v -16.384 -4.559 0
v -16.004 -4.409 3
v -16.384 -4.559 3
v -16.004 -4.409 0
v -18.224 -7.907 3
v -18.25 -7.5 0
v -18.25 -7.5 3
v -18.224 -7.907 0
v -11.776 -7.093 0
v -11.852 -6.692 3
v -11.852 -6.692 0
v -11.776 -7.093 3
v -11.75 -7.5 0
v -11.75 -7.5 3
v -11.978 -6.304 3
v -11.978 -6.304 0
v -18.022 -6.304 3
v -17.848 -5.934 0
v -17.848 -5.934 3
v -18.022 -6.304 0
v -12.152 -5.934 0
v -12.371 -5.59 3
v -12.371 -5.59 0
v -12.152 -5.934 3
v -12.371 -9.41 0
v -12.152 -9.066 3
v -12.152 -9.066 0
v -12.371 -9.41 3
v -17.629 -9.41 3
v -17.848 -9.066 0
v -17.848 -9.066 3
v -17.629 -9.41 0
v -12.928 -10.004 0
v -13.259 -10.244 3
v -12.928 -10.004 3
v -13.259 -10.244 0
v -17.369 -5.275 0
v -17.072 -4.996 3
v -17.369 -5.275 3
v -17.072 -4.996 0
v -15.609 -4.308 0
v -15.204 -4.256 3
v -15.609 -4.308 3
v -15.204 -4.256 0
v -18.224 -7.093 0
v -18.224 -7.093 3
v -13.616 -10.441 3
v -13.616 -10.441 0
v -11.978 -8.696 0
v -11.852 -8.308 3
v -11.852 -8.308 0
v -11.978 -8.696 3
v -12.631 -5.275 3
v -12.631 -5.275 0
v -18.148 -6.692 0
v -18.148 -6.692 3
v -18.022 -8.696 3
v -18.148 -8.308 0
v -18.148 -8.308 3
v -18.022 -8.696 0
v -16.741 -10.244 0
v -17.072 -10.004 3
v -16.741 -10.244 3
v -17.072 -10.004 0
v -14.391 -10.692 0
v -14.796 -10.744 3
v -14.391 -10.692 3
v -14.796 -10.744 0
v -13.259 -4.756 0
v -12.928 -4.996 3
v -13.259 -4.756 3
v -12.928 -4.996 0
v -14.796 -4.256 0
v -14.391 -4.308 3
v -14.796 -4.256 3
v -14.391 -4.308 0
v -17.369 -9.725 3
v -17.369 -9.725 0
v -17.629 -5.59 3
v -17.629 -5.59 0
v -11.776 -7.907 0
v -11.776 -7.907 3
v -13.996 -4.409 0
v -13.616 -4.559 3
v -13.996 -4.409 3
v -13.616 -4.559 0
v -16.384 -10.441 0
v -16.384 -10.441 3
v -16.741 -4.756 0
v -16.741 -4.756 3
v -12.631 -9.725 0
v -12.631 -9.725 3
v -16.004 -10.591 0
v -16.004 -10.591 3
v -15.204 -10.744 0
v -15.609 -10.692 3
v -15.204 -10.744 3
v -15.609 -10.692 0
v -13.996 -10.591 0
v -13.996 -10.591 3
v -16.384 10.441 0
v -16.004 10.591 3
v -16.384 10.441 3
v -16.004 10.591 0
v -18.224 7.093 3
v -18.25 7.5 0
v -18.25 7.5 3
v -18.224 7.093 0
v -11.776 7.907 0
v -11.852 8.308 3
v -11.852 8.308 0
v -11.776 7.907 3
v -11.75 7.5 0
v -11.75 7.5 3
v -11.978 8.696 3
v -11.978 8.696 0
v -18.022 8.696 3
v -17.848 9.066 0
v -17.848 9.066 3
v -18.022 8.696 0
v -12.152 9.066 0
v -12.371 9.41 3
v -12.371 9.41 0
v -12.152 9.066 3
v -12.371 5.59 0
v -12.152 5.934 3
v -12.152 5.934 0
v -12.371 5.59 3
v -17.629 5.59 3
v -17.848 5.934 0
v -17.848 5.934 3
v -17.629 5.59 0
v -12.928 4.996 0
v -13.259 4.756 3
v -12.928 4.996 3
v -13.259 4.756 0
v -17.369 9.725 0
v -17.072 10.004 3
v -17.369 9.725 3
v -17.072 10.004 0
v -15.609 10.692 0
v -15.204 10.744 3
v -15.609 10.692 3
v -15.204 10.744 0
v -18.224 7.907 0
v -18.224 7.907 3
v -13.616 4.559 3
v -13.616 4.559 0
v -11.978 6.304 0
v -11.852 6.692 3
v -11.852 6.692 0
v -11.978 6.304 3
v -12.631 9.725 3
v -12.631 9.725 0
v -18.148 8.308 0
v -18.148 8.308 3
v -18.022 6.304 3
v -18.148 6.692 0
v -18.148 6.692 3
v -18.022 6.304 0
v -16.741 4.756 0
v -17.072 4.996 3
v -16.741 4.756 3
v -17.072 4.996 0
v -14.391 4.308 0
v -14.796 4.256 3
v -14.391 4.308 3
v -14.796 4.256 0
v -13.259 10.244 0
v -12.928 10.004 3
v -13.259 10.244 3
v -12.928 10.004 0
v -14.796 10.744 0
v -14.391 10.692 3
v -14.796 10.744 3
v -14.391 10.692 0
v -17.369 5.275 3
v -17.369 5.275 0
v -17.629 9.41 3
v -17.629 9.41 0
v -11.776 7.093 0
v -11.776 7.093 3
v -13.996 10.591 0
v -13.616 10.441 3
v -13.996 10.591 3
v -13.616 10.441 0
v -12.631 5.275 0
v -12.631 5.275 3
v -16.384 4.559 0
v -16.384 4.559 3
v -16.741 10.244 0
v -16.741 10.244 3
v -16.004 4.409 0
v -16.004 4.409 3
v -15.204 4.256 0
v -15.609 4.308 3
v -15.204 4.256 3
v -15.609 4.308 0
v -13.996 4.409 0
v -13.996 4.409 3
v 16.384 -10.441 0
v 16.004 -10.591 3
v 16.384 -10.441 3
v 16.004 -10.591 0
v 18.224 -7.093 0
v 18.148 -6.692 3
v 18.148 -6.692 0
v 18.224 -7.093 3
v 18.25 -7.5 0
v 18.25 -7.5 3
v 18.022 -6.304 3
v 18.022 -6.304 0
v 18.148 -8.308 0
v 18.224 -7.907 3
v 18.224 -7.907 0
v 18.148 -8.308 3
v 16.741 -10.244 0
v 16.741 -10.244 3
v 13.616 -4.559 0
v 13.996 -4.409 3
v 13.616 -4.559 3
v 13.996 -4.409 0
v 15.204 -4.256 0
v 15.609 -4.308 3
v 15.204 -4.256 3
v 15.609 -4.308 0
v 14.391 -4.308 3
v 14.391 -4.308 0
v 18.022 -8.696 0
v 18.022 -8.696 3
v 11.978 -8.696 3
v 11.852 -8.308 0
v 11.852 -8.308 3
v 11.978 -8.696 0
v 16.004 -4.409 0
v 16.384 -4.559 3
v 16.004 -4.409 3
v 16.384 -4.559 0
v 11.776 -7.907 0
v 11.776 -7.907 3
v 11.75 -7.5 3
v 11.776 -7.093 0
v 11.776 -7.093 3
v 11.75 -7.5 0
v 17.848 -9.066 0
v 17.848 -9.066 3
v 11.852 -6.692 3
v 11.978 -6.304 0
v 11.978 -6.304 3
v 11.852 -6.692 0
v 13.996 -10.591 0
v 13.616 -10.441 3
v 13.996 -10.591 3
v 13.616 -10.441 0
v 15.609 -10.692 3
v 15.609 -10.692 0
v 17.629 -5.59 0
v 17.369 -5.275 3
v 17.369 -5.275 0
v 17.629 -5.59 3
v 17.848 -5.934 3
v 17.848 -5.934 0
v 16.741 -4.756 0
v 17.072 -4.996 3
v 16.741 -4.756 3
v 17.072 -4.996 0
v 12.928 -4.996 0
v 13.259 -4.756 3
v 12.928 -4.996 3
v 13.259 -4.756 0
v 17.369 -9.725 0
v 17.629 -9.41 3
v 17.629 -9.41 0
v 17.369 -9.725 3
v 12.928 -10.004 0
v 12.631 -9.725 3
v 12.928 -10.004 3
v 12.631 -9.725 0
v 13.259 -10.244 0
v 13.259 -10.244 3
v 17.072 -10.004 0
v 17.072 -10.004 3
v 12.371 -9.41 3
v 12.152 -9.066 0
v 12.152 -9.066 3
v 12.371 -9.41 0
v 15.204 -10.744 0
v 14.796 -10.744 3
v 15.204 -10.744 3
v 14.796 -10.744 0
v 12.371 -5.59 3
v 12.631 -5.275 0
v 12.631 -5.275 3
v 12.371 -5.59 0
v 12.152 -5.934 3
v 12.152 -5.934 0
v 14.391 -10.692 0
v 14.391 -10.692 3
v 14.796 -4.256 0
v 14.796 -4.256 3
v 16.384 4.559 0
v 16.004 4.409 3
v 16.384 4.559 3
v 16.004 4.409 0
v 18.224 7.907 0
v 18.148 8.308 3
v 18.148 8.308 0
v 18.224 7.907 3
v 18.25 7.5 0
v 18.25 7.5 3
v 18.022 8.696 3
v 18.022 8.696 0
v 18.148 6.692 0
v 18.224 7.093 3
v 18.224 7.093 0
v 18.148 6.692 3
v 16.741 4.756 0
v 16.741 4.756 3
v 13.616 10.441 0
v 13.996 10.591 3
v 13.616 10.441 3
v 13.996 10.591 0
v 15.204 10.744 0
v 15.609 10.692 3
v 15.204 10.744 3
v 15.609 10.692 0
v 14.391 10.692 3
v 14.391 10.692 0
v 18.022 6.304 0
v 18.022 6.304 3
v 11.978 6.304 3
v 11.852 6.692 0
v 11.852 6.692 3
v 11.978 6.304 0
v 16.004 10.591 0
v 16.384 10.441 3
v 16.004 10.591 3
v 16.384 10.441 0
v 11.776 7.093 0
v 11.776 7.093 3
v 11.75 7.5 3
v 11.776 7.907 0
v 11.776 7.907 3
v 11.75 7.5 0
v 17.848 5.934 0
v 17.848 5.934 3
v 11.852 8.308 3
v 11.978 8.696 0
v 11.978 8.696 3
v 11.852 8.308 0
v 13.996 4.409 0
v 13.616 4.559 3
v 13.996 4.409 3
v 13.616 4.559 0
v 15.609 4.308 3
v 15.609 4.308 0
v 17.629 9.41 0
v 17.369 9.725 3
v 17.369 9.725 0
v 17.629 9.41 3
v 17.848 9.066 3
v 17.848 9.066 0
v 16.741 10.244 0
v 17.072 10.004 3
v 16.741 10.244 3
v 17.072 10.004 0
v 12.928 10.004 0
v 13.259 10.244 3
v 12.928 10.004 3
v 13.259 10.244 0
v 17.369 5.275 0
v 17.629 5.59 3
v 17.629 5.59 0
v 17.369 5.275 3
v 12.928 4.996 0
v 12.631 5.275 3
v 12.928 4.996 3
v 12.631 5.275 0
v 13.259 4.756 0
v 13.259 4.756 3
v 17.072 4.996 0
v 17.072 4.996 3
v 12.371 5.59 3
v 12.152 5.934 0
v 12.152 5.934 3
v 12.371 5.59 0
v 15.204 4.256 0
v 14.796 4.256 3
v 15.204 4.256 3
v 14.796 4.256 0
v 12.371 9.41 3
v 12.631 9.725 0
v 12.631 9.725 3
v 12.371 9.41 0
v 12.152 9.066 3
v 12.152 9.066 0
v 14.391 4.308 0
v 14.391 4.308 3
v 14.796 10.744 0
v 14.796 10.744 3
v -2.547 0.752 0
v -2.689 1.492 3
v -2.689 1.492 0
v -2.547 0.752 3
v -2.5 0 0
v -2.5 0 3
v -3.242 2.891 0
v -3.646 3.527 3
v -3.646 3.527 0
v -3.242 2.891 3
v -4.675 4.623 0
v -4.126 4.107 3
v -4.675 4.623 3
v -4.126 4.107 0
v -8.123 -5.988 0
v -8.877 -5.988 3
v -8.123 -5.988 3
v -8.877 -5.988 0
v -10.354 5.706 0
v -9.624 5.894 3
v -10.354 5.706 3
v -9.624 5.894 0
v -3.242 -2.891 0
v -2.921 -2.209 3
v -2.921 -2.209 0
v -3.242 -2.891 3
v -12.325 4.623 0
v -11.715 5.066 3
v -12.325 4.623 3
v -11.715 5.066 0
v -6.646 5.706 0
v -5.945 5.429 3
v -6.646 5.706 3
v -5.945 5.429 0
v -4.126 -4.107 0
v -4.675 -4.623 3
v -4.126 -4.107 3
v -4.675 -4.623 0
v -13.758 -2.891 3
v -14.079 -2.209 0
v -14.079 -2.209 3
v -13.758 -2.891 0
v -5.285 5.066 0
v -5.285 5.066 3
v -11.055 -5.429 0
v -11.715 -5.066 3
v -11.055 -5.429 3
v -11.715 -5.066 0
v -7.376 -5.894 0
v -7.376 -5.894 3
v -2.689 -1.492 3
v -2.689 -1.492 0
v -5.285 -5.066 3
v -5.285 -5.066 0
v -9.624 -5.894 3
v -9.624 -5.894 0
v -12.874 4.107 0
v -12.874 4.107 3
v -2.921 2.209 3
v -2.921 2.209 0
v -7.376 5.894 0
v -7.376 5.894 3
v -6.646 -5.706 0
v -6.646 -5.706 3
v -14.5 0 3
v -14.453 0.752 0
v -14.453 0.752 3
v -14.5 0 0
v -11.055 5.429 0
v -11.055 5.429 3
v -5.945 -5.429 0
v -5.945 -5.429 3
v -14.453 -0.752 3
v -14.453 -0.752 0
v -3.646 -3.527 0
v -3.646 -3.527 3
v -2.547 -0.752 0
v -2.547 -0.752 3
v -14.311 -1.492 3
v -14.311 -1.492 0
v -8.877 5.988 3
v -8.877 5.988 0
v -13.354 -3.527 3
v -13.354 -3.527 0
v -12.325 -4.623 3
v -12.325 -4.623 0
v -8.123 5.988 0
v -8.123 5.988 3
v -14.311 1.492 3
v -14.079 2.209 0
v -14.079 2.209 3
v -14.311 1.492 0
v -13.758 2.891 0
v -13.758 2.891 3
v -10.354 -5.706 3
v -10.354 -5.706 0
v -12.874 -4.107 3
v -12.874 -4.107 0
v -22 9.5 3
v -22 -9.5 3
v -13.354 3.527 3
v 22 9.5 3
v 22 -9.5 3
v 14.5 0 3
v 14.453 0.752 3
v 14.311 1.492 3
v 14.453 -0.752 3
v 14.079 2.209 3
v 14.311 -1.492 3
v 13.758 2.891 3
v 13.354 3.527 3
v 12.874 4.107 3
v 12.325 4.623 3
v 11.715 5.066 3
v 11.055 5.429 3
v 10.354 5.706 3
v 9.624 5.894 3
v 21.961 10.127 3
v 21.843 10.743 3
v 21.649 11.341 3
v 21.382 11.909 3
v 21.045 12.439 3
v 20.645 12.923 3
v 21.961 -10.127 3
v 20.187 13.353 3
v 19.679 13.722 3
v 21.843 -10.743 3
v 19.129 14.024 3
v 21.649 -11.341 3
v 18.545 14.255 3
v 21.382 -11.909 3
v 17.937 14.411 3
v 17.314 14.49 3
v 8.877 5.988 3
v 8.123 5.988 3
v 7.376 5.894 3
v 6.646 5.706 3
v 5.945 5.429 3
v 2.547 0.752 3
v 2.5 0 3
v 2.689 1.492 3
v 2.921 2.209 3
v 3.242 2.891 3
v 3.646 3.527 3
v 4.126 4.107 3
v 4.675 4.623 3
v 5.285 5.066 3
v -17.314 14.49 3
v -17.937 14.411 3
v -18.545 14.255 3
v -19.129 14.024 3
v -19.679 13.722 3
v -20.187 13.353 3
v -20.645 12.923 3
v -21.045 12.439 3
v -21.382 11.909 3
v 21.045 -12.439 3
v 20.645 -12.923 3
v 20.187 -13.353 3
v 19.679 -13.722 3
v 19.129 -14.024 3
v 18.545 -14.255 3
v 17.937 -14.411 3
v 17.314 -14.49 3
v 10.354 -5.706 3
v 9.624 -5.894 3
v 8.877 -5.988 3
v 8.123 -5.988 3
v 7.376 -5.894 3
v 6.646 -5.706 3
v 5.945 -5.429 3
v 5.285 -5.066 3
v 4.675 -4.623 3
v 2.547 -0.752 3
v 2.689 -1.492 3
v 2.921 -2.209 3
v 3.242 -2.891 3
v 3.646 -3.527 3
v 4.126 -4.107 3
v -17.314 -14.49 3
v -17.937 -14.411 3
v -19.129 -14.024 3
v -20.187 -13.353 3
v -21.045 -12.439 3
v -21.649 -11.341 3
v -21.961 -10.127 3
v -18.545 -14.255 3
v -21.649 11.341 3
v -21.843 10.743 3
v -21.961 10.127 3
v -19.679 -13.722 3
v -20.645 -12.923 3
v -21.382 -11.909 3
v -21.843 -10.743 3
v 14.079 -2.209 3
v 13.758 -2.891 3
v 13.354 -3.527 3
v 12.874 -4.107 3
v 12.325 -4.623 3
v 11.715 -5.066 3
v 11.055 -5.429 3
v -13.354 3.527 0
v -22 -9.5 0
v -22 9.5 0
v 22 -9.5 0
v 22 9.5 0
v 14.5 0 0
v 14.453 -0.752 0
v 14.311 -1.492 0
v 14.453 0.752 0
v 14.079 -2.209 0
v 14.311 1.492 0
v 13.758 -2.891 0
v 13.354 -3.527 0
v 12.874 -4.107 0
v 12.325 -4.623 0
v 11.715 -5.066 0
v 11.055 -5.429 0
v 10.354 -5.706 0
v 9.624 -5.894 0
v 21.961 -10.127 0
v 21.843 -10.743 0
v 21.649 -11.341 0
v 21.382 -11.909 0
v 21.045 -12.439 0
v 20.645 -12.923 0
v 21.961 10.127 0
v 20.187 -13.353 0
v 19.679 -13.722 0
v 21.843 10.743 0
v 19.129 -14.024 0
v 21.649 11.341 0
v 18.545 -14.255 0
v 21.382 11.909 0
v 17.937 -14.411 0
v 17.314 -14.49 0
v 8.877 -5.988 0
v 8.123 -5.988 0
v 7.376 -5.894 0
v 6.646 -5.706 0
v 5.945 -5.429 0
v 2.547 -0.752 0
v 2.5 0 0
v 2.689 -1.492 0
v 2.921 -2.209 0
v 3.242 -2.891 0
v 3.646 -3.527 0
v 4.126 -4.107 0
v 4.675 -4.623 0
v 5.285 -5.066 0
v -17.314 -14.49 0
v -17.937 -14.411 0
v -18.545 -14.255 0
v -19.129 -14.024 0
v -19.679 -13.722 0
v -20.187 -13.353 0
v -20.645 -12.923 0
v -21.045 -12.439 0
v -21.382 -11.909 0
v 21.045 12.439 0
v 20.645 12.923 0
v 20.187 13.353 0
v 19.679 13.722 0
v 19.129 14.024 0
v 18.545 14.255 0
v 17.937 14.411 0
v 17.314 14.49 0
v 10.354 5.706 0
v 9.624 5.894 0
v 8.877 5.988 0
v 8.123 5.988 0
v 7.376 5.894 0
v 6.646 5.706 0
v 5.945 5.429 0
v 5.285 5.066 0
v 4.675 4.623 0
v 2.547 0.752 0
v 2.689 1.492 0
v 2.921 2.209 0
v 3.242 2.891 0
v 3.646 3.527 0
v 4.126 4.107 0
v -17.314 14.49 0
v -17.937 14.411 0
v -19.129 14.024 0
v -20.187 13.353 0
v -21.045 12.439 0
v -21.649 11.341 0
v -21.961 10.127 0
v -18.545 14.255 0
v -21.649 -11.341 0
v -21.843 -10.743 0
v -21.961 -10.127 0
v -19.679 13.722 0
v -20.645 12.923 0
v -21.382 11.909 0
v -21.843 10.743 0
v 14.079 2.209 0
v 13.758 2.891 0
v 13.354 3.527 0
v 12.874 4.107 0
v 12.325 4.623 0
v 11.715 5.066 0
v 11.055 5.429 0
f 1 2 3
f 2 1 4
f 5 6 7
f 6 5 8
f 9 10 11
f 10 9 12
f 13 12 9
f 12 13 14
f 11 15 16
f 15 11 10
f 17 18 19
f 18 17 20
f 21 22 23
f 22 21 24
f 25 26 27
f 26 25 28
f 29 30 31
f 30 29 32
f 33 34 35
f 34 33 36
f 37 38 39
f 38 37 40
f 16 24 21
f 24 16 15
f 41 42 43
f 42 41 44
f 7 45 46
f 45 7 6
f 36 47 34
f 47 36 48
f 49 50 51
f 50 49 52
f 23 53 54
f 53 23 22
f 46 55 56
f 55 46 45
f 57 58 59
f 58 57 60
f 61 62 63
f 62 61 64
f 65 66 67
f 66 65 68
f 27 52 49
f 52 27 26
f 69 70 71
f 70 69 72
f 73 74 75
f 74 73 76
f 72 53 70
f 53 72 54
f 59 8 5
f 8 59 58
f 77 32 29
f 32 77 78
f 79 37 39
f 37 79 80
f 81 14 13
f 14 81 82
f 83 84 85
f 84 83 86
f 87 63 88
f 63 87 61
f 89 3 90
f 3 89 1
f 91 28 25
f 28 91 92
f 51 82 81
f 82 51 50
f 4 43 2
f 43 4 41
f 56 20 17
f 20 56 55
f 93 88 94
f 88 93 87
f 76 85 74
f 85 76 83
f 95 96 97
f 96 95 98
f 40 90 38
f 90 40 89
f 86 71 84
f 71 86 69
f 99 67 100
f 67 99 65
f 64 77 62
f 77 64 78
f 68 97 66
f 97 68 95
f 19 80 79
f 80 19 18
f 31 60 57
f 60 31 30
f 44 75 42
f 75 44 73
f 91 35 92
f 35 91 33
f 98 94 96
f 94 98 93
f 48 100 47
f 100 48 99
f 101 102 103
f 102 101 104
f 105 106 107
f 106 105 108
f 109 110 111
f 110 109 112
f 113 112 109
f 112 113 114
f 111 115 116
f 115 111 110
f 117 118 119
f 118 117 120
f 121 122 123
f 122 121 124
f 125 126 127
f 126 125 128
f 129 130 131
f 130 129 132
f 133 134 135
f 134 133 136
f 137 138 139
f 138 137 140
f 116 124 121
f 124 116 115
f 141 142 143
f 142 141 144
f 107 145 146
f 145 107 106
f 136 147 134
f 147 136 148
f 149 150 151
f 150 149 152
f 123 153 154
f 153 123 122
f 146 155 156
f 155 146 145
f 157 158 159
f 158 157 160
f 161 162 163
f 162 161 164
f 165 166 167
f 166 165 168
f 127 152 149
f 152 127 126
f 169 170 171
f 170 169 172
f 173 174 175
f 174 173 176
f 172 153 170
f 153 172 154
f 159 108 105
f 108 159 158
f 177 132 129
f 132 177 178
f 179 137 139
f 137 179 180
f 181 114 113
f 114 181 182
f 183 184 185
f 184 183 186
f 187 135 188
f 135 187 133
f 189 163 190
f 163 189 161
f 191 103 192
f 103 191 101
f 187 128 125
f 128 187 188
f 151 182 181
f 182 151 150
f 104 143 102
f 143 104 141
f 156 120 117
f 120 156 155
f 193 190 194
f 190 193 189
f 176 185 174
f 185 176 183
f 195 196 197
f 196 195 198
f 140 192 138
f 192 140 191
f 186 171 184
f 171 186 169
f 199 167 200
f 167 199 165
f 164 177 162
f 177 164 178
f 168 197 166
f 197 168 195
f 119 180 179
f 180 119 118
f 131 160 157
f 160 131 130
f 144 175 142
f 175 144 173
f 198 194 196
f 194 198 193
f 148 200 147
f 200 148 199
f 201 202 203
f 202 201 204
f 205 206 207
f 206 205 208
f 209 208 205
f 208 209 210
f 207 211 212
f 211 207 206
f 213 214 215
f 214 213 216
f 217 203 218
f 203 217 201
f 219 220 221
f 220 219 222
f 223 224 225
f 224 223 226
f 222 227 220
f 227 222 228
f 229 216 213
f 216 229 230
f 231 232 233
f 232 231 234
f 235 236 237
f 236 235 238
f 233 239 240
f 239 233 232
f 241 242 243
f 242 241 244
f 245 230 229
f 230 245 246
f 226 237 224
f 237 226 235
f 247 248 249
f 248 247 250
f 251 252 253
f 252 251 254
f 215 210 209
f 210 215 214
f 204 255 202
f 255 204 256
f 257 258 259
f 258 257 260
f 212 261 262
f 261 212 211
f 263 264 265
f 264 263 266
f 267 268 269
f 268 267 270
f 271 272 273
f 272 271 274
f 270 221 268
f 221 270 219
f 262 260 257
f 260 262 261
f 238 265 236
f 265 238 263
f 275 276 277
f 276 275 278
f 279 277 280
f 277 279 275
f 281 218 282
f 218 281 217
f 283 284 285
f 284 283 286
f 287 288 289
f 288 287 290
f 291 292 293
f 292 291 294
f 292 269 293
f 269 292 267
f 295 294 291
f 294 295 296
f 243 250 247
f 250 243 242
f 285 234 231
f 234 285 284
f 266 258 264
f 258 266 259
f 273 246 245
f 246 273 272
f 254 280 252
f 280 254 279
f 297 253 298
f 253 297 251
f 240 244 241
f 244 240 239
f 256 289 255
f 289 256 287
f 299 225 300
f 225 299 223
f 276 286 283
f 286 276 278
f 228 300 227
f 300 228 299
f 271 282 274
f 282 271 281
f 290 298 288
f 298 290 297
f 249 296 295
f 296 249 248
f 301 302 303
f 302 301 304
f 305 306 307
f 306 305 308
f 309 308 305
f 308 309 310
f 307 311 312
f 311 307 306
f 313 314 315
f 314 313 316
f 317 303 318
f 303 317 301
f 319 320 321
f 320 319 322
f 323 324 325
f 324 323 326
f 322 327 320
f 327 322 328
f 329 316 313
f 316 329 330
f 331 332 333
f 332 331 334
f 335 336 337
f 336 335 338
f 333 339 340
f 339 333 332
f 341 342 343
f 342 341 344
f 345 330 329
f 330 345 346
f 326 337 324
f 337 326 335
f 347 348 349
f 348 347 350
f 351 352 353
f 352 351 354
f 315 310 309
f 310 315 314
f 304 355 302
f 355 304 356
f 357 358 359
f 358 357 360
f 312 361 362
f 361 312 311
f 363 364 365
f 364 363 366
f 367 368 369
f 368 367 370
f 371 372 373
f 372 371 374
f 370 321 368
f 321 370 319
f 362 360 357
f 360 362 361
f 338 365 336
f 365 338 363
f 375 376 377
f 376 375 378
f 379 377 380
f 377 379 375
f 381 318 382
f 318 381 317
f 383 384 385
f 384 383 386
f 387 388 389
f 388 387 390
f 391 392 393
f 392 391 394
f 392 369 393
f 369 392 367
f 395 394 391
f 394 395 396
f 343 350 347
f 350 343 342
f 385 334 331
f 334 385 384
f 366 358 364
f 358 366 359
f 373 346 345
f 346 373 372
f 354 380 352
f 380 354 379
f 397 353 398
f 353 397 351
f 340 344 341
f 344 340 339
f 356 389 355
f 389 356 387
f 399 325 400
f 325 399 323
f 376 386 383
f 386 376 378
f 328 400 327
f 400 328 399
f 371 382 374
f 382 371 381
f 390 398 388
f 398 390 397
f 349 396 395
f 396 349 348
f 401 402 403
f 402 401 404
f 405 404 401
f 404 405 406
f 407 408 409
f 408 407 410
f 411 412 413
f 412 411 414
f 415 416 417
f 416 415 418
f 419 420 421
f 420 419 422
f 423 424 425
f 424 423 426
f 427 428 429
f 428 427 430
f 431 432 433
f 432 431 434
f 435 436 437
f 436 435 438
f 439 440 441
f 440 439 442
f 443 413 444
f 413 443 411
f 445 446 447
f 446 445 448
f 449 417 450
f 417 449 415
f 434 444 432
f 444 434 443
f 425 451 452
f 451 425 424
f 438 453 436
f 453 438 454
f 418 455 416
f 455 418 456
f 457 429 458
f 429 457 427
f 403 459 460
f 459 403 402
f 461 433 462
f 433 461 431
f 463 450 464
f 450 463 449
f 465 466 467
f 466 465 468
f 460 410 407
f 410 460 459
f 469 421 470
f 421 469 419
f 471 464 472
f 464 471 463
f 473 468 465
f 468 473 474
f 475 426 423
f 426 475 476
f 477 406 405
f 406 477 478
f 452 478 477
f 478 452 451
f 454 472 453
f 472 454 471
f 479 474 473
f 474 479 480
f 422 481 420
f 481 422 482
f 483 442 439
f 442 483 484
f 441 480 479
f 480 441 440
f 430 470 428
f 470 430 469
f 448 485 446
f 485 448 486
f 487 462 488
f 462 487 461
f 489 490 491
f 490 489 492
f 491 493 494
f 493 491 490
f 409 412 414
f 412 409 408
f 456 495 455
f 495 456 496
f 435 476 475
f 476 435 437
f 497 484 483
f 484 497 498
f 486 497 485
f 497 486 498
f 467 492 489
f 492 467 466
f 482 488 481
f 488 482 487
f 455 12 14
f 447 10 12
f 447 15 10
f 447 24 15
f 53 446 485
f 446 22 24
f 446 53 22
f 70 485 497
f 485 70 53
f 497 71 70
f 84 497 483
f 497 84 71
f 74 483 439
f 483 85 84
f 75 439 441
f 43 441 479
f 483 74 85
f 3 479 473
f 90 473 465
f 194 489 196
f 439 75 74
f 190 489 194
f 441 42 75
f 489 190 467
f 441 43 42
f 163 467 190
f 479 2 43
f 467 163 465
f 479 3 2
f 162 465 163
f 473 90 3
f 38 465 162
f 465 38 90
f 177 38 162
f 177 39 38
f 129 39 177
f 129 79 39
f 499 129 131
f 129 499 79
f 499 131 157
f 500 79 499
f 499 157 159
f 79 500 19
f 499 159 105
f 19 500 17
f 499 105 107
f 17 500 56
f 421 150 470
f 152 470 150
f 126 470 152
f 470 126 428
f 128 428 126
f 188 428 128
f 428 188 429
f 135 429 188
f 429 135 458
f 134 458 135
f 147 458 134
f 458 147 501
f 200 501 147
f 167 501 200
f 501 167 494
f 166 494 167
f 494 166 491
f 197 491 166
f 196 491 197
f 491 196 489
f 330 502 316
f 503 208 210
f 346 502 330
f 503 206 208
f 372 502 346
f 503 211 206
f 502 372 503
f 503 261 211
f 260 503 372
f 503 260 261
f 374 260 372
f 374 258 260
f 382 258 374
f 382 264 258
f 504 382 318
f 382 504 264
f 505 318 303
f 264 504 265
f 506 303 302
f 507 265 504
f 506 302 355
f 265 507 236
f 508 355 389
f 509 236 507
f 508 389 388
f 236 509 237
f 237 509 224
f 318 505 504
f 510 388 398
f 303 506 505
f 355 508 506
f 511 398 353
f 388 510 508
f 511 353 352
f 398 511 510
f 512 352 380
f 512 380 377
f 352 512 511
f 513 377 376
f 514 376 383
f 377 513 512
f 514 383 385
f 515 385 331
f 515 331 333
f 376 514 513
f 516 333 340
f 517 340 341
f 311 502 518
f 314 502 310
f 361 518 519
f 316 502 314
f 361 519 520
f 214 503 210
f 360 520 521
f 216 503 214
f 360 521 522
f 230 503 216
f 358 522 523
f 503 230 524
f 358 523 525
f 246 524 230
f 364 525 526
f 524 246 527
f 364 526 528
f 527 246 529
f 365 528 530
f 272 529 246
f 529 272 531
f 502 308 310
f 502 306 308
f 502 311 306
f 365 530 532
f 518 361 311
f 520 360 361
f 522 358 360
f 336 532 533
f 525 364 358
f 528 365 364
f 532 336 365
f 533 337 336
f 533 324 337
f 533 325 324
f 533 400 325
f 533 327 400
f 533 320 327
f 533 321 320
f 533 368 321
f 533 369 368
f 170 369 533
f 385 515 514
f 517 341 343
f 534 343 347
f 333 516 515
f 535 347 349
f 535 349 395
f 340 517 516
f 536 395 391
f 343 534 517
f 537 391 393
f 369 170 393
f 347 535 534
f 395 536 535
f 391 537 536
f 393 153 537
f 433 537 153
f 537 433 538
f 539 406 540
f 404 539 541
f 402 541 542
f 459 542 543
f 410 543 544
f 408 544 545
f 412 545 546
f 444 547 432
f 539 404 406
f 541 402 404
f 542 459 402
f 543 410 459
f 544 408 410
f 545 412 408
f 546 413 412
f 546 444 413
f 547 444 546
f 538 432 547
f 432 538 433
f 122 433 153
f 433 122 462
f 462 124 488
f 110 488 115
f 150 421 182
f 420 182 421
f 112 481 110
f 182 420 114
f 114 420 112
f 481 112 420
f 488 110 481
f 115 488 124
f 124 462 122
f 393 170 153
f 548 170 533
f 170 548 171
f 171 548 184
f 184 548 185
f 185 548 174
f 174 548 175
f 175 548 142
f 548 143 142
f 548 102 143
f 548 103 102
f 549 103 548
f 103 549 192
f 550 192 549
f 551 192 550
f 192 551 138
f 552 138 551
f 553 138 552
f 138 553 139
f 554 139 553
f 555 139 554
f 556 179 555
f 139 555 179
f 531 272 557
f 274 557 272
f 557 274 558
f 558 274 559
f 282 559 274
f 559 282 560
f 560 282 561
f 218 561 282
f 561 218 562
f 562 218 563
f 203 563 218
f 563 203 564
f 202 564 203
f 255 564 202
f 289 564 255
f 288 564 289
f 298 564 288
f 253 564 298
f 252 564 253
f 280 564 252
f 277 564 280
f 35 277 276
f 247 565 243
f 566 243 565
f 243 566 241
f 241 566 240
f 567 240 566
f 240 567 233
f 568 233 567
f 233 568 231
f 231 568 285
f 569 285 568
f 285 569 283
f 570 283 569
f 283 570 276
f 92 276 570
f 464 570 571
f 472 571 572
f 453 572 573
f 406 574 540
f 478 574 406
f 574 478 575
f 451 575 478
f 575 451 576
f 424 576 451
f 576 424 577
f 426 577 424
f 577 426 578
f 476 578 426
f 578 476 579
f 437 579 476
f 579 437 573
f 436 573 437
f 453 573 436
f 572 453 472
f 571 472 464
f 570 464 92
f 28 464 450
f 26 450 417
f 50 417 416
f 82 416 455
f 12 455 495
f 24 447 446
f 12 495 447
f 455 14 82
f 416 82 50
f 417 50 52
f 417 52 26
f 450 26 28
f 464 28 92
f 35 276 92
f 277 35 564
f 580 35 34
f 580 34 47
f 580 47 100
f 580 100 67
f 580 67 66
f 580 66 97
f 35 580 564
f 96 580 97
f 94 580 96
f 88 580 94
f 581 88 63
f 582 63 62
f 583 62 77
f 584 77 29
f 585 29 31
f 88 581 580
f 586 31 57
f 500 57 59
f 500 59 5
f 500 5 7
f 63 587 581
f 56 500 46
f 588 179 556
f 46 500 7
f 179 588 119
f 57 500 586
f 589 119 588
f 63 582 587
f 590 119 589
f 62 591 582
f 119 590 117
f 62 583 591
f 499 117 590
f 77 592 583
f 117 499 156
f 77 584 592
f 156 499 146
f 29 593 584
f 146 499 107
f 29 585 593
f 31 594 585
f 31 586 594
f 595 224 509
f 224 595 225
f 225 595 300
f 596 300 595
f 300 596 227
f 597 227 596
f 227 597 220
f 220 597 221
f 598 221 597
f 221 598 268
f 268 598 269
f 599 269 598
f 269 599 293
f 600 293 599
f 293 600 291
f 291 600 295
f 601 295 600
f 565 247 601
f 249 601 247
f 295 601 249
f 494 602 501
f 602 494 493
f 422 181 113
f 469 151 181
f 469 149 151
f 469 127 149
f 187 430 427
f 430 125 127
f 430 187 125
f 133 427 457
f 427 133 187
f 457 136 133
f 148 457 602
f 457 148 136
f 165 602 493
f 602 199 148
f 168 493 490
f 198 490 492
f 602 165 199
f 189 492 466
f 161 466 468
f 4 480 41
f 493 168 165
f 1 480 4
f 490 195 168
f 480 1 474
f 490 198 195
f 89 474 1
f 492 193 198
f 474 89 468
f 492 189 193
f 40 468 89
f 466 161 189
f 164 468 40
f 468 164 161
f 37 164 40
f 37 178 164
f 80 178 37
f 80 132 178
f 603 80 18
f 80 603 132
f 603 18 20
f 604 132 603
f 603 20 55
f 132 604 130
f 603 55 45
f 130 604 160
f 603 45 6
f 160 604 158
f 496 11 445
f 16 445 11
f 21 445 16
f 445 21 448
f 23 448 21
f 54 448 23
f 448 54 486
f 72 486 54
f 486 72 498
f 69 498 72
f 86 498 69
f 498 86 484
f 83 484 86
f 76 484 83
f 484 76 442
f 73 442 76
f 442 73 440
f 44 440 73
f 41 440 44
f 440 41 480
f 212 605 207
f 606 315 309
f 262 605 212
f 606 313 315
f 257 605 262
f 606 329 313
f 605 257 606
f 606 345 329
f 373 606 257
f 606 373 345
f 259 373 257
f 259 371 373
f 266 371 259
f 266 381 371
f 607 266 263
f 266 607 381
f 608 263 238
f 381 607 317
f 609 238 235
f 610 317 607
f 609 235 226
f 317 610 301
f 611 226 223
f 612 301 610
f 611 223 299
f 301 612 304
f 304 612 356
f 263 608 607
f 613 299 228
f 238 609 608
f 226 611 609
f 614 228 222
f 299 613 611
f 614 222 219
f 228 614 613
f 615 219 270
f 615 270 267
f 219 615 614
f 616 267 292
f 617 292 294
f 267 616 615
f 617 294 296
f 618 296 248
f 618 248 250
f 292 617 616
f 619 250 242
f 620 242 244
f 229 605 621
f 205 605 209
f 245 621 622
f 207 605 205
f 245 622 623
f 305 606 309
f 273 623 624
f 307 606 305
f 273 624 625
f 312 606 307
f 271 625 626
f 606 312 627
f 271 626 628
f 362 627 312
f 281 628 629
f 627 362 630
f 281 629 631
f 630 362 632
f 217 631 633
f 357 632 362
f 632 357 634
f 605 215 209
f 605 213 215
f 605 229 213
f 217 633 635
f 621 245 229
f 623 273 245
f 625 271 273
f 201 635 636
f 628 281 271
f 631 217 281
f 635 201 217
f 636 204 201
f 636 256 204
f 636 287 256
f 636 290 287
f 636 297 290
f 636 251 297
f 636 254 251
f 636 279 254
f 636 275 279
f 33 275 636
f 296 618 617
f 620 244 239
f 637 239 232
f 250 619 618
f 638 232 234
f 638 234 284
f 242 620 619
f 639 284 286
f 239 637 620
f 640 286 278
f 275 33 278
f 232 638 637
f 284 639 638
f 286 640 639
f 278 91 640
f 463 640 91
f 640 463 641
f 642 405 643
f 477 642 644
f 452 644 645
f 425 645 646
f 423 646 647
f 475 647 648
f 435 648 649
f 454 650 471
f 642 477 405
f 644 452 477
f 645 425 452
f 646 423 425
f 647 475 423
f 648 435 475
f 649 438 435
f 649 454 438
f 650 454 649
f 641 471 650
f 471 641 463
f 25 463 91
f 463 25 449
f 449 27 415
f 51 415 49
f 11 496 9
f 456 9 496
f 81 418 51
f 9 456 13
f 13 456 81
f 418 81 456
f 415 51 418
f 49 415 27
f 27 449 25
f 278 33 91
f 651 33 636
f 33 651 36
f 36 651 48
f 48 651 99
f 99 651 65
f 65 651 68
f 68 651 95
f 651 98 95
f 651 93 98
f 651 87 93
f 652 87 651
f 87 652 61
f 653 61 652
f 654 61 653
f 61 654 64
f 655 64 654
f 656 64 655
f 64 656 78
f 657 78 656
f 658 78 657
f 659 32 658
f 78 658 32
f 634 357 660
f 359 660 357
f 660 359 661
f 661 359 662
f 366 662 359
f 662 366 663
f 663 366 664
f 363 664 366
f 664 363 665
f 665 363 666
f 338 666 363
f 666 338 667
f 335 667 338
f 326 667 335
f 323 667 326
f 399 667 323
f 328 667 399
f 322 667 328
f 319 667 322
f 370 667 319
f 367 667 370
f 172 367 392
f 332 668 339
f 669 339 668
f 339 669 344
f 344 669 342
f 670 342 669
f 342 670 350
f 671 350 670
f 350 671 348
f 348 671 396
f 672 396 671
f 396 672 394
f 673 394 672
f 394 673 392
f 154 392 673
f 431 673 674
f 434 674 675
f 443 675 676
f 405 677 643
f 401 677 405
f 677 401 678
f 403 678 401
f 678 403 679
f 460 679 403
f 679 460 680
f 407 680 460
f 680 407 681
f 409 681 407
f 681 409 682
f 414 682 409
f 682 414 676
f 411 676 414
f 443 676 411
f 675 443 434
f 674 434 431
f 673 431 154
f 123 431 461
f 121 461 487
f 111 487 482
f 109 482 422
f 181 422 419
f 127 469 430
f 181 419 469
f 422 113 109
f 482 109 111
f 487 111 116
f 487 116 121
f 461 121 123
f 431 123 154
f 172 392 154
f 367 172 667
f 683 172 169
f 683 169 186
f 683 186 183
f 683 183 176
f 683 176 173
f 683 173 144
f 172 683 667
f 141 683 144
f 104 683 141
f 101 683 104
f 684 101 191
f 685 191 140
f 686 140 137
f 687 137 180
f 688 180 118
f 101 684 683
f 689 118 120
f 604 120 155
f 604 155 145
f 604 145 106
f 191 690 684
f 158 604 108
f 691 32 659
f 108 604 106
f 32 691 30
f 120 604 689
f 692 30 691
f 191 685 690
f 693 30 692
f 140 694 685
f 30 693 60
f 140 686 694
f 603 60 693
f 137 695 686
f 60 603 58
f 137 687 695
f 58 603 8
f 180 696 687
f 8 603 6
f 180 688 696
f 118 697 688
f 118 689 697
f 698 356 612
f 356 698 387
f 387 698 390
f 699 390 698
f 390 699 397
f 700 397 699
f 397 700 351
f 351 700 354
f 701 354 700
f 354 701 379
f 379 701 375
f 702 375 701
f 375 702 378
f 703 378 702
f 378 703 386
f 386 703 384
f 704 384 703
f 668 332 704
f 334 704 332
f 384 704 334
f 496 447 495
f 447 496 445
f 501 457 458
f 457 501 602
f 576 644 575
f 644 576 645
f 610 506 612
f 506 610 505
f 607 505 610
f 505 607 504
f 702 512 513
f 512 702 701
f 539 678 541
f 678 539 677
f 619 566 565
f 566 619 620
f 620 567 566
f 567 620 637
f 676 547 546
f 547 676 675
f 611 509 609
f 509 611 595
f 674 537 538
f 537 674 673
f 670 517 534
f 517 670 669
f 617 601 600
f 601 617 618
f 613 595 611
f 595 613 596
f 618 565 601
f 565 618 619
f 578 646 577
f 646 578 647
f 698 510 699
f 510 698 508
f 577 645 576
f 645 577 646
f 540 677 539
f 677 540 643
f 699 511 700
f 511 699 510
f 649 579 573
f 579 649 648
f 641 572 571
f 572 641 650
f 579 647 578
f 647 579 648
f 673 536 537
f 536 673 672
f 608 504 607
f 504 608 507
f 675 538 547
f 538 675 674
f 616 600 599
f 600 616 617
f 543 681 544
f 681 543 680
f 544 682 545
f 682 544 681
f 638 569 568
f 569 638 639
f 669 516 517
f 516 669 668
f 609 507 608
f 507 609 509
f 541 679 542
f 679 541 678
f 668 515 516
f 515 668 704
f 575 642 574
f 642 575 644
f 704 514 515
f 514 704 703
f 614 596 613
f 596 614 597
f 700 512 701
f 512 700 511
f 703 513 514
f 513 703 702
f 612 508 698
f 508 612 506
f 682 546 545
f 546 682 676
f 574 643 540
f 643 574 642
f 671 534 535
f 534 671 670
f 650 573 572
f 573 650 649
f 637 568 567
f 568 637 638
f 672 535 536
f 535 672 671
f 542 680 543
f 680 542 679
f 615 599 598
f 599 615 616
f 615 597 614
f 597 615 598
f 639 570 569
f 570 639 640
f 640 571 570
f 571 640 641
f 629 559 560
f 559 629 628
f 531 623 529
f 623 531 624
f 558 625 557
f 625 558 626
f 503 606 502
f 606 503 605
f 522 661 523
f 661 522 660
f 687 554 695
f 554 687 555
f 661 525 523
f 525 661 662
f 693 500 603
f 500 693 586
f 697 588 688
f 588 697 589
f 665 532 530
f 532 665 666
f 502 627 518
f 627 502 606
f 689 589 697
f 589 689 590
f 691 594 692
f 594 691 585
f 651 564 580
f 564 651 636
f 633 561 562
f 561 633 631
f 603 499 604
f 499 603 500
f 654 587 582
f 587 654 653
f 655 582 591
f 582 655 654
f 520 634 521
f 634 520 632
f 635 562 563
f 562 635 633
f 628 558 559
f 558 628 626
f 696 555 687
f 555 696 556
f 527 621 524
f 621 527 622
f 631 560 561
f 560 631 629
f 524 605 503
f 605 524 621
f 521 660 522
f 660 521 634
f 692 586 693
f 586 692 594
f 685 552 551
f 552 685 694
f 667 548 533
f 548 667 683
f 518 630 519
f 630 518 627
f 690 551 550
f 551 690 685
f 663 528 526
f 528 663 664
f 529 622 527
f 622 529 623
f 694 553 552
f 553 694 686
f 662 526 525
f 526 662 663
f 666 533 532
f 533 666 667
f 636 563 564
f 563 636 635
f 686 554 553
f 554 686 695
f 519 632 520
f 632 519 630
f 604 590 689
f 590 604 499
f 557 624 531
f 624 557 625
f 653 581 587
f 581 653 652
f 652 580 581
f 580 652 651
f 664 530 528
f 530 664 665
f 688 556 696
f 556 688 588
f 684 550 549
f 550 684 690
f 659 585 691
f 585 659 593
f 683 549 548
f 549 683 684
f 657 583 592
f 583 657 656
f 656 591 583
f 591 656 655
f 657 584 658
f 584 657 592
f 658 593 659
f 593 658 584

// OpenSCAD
$fn = 50;

difference() {
	union() {
		hull() {
			translate(v = [-17.0, 9.5, 0]) {
				cylinder(h = 3, r = 5);
			}
			translate(v = [17.0, 9.5, 0]) {
				cylinder(h = 3, r = 5);
			}
			translate(v = [-17.0, -9.5, 0]) {
				cylinder(h = 3, r = 5);
			}
			translate(v = [17.0, -9.5, 0]) {
				cylinder(h = 3, r = 5);
			}
		}
	}
	union() {
		translate(v = [-15.0, -7.5, -100.0]) {
			cylinder(h = 200, r = 3.25);
		}
		translate(v = [-15.0, 7.5, -100.0]) {
			cylinder(h = 200, r = 3.25);
		}
		translate(v = [15.0, -7.5, -100.0]) {
			cylinder(h = 200, r = 3.25);
		}
		translate(v = [15.0, 7.5, -100.0]) {
			cylinder(h = 200, r = 3.25);
		}
		translate(v = [-15.0, -7.5, -100.0]) {
			cylinder(h = 200, r = 1.8);
		}
		translate(v = [-15.0, 7.5, -100.0]) {
			cylinder(h = 200, r = 1.8);
		}
		translate(v = [15.0, -7.5, -100.0]) {
			cylinder(h = 200, r = 1.8);
		}
		translate(v = [15.0, 7.5, -100.0]) {
			cylinder(h = 200, r = 1.8);
		}
		translate(v = [-8.5, 0, 0.0]) {
			cylinder(h = 3, r = 6.0);
		}
		translate(v = [8.5, 0, 0.0]) {
			cylinder(h = 3, r = 6.0);
		}
	}
}
